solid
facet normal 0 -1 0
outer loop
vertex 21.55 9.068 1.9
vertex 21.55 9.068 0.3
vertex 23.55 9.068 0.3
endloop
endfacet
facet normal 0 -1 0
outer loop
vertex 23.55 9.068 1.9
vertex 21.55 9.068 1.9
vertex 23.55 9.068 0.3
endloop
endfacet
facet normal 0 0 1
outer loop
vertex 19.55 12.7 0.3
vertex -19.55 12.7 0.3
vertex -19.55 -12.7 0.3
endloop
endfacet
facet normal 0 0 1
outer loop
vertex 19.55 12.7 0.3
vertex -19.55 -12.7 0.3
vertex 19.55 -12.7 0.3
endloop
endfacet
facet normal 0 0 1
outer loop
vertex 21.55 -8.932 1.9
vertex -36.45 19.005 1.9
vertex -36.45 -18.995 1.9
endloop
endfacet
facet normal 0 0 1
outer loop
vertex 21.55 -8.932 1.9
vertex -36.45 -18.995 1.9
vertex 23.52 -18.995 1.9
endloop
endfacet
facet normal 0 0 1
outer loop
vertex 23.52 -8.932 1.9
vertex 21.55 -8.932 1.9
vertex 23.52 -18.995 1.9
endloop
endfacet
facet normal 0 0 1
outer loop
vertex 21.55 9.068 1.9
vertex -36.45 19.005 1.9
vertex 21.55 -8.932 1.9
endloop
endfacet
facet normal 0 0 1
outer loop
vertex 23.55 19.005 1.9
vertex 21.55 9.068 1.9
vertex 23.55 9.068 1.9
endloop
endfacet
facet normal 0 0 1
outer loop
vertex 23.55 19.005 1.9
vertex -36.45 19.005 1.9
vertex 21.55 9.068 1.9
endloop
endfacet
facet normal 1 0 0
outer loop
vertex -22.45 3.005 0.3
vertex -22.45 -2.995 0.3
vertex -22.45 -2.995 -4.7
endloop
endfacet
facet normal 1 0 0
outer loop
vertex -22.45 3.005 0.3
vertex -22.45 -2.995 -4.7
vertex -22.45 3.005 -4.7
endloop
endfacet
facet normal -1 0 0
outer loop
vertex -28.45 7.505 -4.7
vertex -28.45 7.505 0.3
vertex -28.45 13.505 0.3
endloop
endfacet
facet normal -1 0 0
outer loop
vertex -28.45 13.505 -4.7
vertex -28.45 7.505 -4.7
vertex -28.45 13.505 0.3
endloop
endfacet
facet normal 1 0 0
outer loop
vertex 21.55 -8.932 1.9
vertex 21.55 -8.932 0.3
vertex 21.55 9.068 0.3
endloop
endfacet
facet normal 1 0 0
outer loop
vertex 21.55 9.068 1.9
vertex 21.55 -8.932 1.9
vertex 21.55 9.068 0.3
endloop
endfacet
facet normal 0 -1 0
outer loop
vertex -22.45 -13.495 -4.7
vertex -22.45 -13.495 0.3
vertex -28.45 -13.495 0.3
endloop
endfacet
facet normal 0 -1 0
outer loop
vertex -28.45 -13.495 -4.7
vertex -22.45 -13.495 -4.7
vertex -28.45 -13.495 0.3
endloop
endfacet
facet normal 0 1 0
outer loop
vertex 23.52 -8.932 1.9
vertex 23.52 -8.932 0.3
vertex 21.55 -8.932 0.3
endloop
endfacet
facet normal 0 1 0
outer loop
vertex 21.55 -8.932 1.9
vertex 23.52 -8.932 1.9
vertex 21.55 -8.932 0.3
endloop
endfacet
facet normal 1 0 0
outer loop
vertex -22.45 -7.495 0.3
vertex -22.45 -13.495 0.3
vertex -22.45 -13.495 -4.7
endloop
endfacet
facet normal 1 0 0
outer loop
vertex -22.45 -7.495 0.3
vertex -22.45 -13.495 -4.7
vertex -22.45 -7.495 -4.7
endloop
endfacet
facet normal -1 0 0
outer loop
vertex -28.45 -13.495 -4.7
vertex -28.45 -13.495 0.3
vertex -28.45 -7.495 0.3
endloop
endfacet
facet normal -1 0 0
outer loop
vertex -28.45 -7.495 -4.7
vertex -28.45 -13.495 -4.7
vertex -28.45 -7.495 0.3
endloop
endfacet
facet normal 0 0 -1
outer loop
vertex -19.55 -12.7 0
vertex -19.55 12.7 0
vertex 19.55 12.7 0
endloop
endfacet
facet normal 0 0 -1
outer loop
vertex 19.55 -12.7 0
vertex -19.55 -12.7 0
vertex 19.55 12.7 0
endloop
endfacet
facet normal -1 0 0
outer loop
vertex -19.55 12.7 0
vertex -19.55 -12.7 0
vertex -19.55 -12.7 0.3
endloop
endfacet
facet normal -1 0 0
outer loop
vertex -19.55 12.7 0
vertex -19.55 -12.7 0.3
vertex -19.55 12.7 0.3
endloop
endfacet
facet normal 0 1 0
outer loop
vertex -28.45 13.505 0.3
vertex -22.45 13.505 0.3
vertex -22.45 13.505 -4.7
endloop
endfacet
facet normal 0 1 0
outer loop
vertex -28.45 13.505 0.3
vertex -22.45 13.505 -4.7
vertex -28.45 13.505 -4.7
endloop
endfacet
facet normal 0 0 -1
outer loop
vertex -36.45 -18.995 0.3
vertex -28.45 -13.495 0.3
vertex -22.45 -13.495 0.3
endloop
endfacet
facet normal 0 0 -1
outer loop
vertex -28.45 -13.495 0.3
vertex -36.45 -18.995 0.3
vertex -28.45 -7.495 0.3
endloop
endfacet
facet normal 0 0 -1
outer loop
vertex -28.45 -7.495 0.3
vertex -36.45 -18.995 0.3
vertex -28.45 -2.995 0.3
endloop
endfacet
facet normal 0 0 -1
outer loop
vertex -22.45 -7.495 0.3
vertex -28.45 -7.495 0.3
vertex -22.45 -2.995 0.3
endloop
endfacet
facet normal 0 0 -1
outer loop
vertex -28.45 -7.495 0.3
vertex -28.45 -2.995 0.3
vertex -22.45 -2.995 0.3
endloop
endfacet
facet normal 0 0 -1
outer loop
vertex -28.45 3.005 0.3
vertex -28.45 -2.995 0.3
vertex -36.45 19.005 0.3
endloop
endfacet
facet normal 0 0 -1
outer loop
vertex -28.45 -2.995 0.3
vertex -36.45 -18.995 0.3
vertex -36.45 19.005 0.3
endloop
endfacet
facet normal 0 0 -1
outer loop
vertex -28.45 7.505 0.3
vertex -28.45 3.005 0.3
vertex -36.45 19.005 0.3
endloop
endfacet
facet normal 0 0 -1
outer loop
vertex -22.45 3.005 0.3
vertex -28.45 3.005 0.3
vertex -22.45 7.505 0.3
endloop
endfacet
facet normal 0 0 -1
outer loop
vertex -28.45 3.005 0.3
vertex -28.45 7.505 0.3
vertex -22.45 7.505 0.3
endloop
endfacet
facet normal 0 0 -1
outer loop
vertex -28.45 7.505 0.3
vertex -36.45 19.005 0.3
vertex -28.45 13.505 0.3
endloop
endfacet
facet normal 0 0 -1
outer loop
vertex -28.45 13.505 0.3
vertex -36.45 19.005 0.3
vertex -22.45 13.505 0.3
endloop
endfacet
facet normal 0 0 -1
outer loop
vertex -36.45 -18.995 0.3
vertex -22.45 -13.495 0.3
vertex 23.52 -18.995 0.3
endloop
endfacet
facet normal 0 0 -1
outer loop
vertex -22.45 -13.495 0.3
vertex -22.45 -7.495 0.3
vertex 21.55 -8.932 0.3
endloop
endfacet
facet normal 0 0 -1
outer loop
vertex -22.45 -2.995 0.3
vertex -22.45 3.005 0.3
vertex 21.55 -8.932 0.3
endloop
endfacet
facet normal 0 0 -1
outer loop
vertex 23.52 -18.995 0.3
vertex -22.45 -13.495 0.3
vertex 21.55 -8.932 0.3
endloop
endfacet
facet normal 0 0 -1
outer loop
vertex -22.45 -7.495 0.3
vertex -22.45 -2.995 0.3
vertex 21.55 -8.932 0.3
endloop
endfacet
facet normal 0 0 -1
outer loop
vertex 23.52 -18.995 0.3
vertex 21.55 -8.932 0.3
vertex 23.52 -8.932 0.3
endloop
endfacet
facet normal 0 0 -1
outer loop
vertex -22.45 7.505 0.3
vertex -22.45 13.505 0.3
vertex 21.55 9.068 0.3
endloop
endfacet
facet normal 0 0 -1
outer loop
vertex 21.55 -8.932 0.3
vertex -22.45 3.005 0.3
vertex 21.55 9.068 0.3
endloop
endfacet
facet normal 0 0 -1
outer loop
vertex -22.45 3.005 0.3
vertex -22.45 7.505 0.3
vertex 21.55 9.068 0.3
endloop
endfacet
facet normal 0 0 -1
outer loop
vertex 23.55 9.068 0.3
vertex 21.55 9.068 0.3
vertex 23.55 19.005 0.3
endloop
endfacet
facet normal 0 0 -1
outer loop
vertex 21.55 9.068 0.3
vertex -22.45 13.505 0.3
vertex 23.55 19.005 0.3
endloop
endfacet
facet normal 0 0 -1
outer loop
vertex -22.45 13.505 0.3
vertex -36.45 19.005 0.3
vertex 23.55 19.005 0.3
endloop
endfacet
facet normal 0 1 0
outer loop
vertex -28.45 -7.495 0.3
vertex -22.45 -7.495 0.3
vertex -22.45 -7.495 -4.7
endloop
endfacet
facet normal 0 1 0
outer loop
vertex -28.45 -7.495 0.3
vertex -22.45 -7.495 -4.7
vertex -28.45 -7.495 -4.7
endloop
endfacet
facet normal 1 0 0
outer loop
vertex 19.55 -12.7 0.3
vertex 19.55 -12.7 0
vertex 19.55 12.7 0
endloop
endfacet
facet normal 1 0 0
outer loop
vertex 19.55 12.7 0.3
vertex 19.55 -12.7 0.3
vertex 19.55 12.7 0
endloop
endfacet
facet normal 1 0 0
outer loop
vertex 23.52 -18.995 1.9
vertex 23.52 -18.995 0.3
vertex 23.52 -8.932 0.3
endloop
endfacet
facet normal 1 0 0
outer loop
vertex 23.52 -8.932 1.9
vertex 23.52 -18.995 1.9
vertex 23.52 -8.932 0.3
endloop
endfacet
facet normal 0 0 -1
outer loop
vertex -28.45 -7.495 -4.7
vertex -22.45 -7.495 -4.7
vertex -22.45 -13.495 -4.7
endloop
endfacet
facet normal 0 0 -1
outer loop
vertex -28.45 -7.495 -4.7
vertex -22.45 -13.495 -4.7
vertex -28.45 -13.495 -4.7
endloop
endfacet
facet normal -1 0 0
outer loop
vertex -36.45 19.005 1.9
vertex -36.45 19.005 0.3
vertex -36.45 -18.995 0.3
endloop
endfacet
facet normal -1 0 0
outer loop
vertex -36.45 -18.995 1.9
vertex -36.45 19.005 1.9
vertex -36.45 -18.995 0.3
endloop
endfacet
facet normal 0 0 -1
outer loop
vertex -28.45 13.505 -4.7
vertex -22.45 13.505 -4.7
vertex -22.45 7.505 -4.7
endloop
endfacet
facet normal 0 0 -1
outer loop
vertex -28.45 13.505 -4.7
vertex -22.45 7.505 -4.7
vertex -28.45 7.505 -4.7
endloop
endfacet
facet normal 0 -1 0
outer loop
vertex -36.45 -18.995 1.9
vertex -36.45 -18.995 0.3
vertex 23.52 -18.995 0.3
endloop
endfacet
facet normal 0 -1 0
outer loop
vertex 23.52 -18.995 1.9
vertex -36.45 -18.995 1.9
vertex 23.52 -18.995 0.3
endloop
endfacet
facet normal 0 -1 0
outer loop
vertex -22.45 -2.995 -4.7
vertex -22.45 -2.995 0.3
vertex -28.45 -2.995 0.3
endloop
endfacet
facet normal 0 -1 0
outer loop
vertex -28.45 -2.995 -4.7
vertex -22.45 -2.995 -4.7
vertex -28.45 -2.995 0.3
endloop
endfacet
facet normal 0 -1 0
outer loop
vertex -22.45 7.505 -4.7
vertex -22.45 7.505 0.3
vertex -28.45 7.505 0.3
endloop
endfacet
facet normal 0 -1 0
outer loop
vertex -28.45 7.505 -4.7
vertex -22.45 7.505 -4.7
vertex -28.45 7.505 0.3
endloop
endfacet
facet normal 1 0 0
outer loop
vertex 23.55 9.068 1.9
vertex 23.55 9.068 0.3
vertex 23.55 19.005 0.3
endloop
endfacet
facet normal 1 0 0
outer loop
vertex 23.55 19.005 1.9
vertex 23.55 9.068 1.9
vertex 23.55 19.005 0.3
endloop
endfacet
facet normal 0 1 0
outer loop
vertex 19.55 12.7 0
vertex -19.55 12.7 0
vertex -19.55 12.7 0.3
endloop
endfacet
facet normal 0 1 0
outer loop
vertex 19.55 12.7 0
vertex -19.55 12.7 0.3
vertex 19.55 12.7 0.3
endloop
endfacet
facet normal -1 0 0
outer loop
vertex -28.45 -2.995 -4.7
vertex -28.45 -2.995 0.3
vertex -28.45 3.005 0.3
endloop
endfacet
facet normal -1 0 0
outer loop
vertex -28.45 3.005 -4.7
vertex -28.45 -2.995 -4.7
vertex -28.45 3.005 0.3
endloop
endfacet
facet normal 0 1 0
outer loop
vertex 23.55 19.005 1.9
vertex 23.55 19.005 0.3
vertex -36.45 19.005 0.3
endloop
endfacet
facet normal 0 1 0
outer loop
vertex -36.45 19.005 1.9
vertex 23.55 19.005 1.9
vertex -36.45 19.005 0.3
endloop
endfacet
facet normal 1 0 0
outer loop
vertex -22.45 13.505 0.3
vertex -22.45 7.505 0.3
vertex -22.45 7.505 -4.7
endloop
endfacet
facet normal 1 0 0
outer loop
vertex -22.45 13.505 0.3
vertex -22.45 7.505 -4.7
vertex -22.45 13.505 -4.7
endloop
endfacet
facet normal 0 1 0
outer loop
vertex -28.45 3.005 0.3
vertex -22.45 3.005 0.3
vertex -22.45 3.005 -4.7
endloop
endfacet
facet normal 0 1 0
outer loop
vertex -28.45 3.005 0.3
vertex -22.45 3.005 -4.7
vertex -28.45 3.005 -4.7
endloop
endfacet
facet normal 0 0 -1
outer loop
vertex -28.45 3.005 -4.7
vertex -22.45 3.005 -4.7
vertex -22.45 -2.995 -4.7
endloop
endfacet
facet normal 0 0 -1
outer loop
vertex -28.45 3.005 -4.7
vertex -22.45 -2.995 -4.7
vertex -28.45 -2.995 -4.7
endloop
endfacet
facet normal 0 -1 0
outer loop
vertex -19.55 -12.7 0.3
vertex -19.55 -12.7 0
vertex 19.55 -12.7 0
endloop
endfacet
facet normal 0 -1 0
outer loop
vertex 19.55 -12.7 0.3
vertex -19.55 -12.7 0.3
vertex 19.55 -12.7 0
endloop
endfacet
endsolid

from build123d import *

# Parameters (mm, degrees)
SKETCH_1_W      = 39.1
SKETCH_1_H      = 25.4
EXTRUDE_1_DEPTH = 0.3
EXTRUDE_2_DEPTH = 1.6
SKETCH_3_W      = 6
SKETCH_3_H      = 6
EXTRUDE_3_DEPTH = 5


with BuildPart() as part:
    # 草图1 → 凸台-拉伸1 (new body)
    with BuildSketch(Plane.XY):
        Rectangle(SKETCH_1_W, SKETCH_1_H)
    extrude(amount=EXTRUDE_1_DEPTH)


with BuildPart() as body_2:
    # 草图2 → 凸台-拉伸2 (new body)
    with BuildSketch(Plane.XY.offset(0.3)):
        Polygon((23.55, 9.068338111), (23.55, 19.004767958), (-36.45, 19.004767958), (-36.45, -18.995220086), (23.51985639, -18.995220086), (23.51985639, -8.931661889), (21.55, -8.931661889), (21.55, 9.068338111), align=None)
    extrude(amount=EXTRUDE_2_DEPTH)

    # 草图3 → 凸台-拉伸3 (add)
    with BuildSketch(Plane(origin=(0, 0, 0.3), x_dir=(-1, 0, 0), z_dir=(0, 0, -1))):
        with Locations((25.45, 10.504767958)):
            Rectangle(SKETCH_3_W, SKETCH_3_H)
        with Locations((25.45, 0.004779914)):
            Rectangle(SKETCH_3_W, SKETCH_3_H)
        with Locations((25.45, -10.495220086)):
            Rectangle(SKETCH_3_W, SKETCH_3_H)
    extrude(amount=EXTRUDE_3_DEPTH)


solid = Compound([part.part, body_2.part])
